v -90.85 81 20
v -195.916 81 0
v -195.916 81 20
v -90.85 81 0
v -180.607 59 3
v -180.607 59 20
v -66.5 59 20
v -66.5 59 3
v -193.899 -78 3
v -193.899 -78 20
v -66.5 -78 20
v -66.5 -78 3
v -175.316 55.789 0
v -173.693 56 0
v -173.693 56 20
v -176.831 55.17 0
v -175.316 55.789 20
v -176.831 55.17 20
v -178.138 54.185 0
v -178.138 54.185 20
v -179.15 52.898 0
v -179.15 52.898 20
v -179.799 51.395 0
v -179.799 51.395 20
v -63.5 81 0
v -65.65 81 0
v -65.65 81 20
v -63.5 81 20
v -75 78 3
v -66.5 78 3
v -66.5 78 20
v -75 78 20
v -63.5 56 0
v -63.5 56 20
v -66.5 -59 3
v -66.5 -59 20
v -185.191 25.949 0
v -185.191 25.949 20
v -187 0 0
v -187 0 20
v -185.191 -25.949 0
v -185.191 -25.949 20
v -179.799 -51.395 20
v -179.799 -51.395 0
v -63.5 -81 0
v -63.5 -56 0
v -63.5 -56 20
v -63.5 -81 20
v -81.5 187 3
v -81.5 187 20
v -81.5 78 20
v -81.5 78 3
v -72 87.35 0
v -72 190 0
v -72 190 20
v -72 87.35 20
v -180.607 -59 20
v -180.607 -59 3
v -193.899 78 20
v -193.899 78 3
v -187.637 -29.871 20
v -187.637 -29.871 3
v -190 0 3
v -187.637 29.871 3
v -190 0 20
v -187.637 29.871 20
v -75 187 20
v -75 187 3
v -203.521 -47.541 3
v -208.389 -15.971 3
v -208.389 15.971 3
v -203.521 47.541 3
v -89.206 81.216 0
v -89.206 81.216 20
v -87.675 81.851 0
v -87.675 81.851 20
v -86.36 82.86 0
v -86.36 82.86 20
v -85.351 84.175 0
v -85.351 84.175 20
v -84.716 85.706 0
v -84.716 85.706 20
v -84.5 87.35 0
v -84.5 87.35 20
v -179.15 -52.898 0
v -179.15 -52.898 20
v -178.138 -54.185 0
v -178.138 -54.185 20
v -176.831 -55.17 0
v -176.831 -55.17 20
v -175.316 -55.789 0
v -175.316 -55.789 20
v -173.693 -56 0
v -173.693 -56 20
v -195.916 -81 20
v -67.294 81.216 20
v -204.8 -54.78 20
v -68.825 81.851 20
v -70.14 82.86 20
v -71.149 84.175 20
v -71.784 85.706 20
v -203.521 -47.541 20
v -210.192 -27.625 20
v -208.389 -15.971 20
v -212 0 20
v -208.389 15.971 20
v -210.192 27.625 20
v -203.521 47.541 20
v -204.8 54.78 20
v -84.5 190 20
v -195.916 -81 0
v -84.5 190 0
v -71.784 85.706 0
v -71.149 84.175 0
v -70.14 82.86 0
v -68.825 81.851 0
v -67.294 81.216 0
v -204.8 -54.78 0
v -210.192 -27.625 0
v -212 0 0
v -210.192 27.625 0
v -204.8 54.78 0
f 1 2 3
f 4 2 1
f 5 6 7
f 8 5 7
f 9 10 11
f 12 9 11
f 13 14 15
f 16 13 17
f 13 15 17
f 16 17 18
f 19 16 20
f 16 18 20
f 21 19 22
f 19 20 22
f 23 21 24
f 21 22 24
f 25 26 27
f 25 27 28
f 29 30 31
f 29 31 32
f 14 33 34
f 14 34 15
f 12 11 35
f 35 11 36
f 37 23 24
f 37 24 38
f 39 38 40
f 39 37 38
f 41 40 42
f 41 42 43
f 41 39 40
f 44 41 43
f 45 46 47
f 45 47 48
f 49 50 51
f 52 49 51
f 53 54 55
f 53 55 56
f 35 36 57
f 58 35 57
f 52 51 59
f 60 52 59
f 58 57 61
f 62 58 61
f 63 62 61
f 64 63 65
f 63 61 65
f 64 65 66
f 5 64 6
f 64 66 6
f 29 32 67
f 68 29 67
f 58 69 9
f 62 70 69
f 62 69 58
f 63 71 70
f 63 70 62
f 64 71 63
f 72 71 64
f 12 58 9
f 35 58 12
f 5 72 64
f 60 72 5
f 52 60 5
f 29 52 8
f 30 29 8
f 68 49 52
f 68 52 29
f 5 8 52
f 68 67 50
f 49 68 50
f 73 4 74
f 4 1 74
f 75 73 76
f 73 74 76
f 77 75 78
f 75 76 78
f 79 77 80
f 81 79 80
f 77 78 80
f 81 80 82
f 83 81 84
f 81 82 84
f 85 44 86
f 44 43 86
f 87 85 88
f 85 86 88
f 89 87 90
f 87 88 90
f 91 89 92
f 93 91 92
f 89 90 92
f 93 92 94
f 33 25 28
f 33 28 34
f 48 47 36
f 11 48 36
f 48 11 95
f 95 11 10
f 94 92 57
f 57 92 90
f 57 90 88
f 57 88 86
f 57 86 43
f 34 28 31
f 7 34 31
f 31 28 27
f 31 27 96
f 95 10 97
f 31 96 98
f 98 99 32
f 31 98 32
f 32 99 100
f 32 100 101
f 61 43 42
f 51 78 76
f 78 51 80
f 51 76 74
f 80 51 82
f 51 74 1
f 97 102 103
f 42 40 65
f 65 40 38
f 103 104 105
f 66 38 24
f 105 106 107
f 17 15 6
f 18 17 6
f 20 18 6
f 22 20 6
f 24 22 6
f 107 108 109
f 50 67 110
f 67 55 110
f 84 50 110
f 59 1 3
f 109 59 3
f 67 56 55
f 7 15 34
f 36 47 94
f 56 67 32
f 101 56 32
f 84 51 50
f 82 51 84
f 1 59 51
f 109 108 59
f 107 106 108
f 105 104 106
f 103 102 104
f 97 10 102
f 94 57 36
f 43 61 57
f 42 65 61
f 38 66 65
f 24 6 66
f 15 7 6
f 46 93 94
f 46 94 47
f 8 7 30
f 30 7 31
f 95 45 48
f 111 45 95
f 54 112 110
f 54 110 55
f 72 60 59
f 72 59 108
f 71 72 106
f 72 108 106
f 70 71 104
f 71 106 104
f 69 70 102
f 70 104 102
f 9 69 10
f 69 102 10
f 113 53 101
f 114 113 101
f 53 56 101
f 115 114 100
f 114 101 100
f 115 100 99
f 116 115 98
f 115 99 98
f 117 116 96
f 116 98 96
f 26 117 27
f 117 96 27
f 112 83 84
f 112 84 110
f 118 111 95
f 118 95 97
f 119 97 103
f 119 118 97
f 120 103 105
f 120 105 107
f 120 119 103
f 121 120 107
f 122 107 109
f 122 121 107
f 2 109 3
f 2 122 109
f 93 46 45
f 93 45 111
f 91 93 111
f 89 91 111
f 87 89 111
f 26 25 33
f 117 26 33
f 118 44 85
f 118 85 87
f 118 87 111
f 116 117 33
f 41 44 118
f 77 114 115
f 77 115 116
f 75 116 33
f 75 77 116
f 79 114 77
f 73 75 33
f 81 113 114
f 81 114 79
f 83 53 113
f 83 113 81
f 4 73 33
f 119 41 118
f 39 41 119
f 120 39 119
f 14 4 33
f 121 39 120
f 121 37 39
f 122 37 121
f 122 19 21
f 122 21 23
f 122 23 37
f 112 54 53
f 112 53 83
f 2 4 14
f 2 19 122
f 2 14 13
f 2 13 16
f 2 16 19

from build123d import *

# Parameters (mm, degrees)
BOSS_EXTRUDE1_DEPTH = 20
CUT_EXTRUDE1_DEPTH  = 17
FILLET1_R           = 6.35


with BuildPart() as part:
    # Sketch1 → Boss-Extrude1 (new body)
    with BuildSketch(Plane.XY):
        with BuildLine():
            Line((-195.91579824, 81), (-84.5, 81))
            Line((-84.5, 81), (-84.5, 190))
            Line((-84.5, 190), (-72, 190))
            Line((-72, 190), (-72, 81))
            Line((-72, 81), (-63.5, 81))
            Line((-63.5, 81), (-63.5, 56))
            Line((-63.5, 56), (-178.418048414, 56))
            ThreePointArc((-178.418048414, 56), (-187, 0), (-178.418048414, -56))
            Line((-178.418048414, -56), (-63.5, -56))
            Line((-63.5, -56), (-63.5, -81))
            Line((-63.5, -81), (-195.91579824, -81))
            ThreePointArc((-195.91579824, -81), (-212, 0), (-195.91579824, 81))
        make_face()
    extrude(amount=BOSS_EXTRUDE1_DEPTH)

    # Sketch2 → Cut-Extrude1 (cut)
    with BuildSketch(Plane.XY.offset(20)):
        with BuildLine():
            Line((-66.5, 78), (-75, 78))
            Line((-75, 78), (-75, 187))
            Line((-75, 187), (-81.5, 187))
            Line((-81.5, 187), (-81.5, 78))
            Line((-81.5, 78), (-193.899458483, 78))
            ThreePointArc((-193.899458483, 78), (-209, 0), (-193.899458483, -78))
            Line((-193.899458483, -78), (-66.5, -78))
            Line((-66.5, -78), (-66.5, -59))
            Line((-66.5, -59), (-180.607308822, -59))
            ThreePointArc((-180.607308822, -59), (-190, 0), (-180.607308822, 59))
            Line((-180.607308822, 59), (-66.5, 59))
            Line((-66.5, 59), (-66.5, 78))
        make_face()
    extrude(amount=-CUT_EXTRUDE1_DEPTH, mode=Mode.SUBTRACT)

    # Fillet1
    fillet1_edges = [part.edges().sort_by_distance(p)[0] for p in [
        (-178.418048414, 56, 10),
        (-178.418048414, -56, 10),
        (-84.5, 81, 10),
        (-72, 81, 10),
    ]]
    fillet(fillet1_edges, radius=FILLET1_R)


solid = part.part
